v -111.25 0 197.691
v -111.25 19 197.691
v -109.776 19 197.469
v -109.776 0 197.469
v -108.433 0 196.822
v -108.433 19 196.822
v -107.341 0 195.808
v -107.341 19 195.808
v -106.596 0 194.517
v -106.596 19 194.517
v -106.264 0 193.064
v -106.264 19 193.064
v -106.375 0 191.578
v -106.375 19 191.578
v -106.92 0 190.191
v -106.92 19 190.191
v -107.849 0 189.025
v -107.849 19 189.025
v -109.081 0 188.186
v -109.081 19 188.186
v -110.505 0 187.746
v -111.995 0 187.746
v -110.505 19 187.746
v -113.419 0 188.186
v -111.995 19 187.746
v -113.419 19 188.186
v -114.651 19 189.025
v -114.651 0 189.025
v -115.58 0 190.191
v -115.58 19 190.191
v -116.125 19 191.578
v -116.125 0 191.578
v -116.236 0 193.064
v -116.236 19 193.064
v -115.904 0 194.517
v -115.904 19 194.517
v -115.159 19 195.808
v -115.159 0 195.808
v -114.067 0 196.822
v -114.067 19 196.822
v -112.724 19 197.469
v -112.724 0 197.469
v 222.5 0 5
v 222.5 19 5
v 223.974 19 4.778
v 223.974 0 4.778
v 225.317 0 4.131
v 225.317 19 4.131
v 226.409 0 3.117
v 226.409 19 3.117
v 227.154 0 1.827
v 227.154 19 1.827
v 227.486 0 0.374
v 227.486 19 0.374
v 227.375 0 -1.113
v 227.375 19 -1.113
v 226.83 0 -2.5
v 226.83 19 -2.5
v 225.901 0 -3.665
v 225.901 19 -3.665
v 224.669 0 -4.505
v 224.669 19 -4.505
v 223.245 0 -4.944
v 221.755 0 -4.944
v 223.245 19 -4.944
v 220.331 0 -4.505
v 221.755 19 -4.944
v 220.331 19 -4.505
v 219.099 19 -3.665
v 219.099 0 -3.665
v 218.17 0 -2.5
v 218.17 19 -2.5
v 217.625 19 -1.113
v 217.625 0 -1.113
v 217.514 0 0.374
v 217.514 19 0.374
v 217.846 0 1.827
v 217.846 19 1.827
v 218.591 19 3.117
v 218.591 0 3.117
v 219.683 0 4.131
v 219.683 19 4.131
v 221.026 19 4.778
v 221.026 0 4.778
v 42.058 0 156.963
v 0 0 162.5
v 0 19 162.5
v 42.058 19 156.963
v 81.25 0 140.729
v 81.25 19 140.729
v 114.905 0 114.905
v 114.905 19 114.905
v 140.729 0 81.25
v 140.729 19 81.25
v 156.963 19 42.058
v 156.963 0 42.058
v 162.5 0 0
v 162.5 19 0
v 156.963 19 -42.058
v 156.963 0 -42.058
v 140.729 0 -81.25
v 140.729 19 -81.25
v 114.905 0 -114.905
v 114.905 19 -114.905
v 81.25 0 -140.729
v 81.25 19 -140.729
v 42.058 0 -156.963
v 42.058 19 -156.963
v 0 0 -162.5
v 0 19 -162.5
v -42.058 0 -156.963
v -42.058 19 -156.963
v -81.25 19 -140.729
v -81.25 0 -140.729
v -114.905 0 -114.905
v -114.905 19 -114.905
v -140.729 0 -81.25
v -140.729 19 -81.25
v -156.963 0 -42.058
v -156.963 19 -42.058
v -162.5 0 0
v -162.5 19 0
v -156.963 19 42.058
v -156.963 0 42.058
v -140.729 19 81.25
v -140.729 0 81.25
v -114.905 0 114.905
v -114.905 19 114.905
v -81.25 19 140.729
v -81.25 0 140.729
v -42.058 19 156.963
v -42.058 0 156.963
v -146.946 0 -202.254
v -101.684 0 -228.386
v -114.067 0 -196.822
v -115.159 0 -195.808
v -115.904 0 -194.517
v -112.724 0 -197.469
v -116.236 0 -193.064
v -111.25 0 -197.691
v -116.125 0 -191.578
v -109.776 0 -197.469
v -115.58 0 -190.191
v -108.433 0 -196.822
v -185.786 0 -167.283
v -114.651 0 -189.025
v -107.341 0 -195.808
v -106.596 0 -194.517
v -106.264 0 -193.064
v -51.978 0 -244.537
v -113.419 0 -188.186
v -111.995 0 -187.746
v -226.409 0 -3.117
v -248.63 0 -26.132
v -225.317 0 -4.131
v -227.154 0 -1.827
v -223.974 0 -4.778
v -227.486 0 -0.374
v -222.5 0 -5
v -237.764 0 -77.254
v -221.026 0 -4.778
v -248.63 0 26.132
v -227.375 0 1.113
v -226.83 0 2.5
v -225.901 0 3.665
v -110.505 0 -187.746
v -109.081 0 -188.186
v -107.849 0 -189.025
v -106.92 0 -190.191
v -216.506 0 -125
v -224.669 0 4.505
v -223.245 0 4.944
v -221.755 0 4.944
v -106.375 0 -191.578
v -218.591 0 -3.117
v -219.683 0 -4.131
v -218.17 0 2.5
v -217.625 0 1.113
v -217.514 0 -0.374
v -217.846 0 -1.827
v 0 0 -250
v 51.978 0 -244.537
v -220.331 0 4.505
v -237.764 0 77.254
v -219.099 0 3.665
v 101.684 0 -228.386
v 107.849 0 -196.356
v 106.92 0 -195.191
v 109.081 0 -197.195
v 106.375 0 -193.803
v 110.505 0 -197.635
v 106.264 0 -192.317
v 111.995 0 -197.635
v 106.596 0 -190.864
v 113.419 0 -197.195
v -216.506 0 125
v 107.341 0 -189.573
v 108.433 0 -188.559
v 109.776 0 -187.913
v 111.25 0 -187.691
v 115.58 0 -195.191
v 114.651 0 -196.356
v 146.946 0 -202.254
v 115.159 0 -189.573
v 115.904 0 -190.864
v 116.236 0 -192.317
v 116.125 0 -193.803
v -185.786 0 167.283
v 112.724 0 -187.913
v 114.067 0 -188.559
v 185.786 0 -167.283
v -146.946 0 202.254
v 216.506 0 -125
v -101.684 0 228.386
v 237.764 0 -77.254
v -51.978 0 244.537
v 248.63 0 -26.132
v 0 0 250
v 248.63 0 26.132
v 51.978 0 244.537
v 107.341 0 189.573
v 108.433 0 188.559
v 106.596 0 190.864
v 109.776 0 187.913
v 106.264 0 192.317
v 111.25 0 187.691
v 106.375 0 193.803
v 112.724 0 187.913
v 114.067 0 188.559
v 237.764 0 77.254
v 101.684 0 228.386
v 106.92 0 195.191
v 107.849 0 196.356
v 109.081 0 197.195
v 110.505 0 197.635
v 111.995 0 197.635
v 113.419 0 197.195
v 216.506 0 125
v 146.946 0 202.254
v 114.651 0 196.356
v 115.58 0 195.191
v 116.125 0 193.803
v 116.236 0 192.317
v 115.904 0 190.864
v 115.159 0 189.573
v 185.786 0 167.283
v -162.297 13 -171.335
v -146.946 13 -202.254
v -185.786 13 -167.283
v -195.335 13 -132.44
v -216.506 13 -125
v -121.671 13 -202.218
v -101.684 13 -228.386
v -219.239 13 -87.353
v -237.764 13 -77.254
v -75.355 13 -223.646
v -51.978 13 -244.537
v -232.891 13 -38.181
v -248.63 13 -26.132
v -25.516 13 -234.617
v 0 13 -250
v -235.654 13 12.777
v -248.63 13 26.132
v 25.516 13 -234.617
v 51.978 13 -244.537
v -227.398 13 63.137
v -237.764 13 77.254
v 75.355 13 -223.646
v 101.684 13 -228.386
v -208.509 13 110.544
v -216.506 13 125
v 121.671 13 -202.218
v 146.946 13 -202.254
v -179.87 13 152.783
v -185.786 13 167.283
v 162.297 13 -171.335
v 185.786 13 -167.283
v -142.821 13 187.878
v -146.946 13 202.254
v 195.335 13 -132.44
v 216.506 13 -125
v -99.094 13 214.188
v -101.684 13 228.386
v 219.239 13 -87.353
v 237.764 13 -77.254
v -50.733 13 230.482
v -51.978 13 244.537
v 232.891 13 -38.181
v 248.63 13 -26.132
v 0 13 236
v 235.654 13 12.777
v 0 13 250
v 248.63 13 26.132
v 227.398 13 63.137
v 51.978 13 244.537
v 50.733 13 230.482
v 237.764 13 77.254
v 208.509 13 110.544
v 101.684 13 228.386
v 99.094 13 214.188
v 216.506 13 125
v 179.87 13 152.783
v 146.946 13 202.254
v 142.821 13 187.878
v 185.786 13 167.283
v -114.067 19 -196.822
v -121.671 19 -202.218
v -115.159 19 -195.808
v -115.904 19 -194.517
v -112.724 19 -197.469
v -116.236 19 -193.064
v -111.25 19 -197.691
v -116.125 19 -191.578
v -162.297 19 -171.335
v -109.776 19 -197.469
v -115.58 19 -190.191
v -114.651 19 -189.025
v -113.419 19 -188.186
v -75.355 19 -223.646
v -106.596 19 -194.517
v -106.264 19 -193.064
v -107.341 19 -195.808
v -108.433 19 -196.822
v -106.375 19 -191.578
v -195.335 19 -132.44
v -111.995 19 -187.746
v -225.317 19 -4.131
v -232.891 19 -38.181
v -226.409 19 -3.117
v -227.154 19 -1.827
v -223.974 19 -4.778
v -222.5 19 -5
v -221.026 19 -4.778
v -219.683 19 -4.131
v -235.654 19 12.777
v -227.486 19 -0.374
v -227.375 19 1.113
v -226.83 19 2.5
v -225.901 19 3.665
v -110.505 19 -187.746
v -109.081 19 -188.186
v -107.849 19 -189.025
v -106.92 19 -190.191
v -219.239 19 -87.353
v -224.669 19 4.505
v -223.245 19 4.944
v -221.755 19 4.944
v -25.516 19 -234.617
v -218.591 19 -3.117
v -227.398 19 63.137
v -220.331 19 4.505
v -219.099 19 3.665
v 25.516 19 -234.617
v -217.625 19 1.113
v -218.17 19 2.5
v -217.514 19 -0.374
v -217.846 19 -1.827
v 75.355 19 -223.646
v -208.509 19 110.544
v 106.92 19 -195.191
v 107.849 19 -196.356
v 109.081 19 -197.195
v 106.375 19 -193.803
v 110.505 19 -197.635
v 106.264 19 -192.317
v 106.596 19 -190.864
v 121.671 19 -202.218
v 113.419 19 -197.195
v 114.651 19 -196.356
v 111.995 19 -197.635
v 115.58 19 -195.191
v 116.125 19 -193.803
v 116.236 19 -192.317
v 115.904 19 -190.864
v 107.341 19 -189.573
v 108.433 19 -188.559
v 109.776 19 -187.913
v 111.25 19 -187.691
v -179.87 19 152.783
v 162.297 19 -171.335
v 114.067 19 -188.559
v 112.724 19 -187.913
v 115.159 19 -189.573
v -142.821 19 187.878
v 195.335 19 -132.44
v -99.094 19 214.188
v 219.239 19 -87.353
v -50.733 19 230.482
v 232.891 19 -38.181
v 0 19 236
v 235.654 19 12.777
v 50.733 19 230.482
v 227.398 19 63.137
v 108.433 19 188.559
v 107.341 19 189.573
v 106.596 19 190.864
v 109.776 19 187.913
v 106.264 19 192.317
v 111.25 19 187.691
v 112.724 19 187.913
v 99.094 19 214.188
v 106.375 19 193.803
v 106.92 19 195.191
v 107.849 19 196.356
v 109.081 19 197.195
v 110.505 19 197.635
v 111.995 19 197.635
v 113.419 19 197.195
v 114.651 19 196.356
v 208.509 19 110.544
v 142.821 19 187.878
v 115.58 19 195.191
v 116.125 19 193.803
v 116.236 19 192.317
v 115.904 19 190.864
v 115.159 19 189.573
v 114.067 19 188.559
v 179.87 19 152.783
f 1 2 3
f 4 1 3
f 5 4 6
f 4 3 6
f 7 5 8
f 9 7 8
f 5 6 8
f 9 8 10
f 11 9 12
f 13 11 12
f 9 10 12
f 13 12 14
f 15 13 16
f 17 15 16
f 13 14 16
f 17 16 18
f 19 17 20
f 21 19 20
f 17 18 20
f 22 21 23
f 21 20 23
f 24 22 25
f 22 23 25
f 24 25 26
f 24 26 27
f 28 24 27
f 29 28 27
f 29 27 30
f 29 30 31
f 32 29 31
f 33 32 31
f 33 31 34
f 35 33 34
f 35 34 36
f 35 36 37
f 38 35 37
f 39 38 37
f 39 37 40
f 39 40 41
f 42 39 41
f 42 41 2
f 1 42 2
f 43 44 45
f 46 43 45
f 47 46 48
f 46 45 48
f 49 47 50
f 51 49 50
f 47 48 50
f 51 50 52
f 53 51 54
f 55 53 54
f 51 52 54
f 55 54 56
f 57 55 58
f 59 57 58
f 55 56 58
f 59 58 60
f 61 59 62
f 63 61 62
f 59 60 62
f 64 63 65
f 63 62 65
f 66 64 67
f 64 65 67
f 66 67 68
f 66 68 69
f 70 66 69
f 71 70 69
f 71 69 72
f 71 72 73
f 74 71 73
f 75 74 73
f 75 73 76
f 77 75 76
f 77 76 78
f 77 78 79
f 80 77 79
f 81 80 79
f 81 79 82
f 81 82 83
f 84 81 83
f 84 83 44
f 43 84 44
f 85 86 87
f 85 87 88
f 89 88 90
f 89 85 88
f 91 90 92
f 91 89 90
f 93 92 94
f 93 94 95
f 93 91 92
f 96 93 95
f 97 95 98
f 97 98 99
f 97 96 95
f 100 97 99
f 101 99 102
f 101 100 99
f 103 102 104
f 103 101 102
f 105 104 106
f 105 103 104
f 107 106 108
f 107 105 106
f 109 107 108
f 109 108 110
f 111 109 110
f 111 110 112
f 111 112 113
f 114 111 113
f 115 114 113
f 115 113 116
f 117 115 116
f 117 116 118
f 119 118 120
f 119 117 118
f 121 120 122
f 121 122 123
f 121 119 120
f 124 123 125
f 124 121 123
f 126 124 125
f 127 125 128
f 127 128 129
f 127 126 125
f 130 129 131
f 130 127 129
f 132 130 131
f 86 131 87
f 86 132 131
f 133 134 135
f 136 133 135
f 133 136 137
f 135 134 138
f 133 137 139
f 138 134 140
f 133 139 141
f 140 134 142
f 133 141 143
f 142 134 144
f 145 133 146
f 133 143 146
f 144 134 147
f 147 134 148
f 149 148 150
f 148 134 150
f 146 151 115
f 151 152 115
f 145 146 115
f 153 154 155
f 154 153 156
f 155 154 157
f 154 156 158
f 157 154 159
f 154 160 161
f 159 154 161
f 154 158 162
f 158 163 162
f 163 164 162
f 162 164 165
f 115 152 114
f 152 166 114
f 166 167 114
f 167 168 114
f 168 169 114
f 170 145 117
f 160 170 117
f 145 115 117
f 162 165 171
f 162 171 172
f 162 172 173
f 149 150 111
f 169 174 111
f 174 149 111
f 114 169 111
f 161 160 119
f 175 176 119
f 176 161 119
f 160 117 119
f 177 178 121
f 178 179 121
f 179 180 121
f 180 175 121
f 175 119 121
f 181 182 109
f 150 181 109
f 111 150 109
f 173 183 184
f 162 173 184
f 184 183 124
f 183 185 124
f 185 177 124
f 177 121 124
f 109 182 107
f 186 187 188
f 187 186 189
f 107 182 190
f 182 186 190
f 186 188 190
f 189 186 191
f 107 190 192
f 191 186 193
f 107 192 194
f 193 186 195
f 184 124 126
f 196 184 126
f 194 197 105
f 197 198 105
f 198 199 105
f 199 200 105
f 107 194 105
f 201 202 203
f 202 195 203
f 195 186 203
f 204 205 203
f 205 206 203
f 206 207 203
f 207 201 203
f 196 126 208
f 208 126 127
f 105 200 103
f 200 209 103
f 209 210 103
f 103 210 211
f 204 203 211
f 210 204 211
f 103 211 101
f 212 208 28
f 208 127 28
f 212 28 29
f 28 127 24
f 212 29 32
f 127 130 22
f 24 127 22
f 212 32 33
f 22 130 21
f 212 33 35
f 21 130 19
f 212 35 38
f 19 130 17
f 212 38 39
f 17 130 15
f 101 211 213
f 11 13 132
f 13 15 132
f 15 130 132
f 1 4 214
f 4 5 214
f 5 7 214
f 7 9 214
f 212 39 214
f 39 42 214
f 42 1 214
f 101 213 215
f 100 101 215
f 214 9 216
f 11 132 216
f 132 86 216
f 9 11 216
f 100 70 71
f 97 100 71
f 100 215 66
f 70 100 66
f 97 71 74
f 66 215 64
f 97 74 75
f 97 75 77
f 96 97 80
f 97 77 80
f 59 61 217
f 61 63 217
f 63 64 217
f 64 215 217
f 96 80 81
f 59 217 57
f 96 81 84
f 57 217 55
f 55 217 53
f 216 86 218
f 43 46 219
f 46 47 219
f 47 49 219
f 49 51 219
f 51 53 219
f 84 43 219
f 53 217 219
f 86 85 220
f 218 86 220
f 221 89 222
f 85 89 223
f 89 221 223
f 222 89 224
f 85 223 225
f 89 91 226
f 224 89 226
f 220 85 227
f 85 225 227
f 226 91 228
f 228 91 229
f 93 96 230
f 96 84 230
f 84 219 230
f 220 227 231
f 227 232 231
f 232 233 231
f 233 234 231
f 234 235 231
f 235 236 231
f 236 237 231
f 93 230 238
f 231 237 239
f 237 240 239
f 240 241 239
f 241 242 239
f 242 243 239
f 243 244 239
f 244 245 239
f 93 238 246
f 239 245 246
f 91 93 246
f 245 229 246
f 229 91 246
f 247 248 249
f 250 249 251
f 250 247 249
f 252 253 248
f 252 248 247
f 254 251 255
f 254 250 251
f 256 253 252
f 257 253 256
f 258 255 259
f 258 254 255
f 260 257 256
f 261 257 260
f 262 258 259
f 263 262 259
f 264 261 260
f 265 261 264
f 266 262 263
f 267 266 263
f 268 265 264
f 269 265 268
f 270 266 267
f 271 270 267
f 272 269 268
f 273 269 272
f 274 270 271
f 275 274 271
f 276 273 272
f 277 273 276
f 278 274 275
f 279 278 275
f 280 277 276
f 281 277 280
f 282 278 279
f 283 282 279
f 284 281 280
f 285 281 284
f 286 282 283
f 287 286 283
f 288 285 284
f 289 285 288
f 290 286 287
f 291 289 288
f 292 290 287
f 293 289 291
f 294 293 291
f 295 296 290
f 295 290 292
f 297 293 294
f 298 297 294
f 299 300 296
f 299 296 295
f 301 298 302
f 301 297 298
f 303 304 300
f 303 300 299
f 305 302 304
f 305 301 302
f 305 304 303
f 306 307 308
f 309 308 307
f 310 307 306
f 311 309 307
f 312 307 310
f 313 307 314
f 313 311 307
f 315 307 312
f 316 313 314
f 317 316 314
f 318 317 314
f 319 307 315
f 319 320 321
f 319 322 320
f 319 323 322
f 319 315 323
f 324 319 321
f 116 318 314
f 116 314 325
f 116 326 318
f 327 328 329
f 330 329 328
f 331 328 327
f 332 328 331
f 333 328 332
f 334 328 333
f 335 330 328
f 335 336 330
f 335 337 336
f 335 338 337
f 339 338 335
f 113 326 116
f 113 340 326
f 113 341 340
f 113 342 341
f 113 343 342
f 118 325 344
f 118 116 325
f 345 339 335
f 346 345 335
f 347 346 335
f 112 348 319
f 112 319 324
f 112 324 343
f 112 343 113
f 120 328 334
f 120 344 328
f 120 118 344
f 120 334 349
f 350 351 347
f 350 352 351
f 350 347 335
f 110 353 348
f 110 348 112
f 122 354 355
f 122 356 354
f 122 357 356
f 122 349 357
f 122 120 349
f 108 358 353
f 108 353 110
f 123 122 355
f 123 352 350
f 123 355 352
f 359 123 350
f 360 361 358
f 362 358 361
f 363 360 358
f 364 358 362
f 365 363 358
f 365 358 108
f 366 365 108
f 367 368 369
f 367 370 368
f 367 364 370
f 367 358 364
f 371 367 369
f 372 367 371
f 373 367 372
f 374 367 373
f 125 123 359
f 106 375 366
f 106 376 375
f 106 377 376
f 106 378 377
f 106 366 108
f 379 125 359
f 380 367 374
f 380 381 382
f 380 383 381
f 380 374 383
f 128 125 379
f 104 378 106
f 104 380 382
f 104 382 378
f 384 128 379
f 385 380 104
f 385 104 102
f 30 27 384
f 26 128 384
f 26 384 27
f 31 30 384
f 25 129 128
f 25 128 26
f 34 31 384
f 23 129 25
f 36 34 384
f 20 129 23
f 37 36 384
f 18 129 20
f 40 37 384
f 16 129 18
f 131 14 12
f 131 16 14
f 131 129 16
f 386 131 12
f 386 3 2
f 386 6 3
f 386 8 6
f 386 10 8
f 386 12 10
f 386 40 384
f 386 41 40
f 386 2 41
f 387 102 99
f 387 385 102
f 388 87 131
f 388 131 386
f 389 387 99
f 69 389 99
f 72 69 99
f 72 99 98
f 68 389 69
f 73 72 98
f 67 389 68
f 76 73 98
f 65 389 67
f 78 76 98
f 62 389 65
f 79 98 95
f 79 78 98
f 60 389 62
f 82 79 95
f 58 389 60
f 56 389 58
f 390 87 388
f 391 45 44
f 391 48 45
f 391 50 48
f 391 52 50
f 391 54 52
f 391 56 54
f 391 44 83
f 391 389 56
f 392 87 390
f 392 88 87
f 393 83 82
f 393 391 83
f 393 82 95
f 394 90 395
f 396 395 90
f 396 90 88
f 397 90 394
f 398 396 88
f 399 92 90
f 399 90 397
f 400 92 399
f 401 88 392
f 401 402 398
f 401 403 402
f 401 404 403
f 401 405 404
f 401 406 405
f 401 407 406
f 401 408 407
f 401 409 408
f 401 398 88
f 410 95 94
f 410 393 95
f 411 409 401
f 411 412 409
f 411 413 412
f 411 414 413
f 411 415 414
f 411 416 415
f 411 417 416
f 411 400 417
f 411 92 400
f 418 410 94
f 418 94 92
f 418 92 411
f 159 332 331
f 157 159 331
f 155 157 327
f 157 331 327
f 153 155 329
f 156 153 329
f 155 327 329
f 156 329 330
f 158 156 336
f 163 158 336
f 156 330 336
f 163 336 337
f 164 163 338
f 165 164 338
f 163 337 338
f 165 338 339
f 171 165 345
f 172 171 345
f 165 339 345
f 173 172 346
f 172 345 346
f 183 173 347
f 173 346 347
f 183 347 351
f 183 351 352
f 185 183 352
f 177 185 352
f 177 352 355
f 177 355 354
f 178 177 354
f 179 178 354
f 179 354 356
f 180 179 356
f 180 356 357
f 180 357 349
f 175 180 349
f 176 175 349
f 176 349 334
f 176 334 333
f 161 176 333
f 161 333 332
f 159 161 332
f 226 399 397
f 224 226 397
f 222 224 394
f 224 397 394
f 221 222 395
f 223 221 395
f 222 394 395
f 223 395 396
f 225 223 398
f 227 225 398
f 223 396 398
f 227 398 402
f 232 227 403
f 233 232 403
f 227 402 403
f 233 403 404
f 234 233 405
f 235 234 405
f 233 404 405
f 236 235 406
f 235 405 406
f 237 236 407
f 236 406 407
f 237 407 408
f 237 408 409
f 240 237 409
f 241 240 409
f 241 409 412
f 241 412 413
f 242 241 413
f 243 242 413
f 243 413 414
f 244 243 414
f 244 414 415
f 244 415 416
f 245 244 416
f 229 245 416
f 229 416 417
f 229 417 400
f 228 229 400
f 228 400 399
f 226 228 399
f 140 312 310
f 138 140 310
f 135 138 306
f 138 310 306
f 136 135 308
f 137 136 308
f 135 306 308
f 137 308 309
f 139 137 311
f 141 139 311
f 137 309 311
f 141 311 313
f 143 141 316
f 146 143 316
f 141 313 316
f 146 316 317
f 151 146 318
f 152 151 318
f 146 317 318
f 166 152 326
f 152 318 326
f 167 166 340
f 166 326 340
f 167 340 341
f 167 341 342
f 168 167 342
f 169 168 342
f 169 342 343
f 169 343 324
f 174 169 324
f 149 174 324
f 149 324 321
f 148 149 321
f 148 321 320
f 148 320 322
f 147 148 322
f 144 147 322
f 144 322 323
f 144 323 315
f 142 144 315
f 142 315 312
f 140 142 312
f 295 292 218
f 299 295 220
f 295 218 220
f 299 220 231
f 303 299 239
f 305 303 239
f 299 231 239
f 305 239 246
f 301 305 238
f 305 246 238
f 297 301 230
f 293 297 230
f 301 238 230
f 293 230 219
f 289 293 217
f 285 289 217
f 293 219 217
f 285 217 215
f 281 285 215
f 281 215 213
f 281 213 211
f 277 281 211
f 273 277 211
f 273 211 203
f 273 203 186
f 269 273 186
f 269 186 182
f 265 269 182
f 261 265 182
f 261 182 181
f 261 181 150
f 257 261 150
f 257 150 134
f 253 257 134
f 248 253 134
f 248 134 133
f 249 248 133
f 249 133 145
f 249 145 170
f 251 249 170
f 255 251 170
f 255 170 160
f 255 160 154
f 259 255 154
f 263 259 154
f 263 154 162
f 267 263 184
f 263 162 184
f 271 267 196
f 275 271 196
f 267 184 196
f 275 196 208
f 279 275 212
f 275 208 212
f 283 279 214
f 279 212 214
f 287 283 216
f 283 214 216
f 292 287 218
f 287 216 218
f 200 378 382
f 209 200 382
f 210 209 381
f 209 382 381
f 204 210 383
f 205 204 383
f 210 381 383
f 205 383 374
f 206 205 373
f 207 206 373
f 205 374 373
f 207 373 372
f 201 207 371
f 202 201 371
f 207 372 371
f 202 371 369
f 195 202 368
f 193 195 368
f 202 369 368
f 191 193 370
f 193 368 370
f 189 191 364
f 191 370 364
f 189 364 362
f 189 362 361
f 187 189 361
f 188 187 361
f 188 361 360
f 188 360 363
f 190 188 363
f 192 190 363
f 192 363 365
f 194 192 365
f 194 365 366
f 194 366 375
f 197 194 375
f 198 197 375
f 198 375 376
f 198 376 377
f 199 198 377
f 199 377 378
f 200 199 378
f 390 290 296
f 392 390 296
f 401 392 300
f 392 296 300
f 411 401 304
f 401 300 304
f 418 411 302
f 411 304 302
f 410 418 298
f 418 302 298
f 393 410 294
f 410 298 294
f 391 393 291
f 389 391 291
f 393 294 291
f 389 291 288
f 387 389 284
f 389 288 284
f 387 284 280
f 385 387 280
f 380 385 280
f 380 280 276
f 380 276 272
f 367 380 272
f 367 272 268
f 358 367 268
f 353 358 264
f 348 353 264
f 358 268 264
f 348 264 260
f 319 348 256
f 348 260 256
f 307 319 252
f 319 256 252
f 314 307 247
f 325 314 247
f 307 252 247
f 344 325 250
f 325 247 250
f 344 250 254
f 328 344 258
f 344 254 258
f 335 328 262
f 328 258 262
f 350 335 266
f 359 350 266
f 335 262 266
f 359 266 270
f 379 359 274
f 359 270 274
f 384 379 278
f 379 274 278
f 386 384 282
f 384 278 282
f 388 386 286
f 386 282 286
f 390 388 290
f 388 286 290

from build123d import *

# Parameters (mm, degrees)
SKETCH1_R           = 250
SKETCH1_R_2         = 162.5
BOSS_EXTRUDE1_DEPTH = 19
CUT_EXTRUDE1_START  = -6
SKETCH2_R           = 250
SKETCH2_R_2         = 236
CUT_EXTRUDE1_DEPTH  = 6
SKETCH3_R           = 5
CUT_EXTRUDE2_DEPTH  = 355.063553617


with BuildPart() as part:
    # Sketch1 → Boss-Extrude1 (new body)
    with BuildSketch(Plane(origin=(0, 0, 0), x_dir=(1, 0, 0), z_dir=(0, 1, 0))):
        with Locations(Location((0, 0, 0), (0, 0, 270))):
            Circle(SKETCH1_R)
        with Locations(Location((0, 0, 0), (0, 0, 270))):
            Circle(SKETCH1_R_2, mode=Mode.SUBTRACT)
    extrude(amount=BOSS_EXTRUDE1_DEPTH)

    # Sketch2 → Cut-Extrude1 (cut)
    with BuildSketch(Plane(origin=(0, 19, 0), x_dir=(1, 0, 0), z_dir=(0, 1, 0)).offset(CUT_EXTRUDE1_START)):
        with Locations(Location((0, 0, 0), (0, 0, 270))):
            Circle(SKETCH2_R)
        with Locations(Location((0, 0, 0), (0, 0, 270))):
            Circle(SKETCH2_R_2, mode=Mode.SUBTRACT)
    extrude(amount=CUT_EXTRUDE1_DEPTH, mode=Mode.SUBTRACT)

    # Sketch3 → Cut-Extrude2 (cut, through all)
    with BuildSketch(Plane(origin=(0, 19, 0), x_dir=(1, 0, 0), z_dir=(0, 1, 0))):
        with Locations(Location((111.25, 192.690652342, 0), (0, 0, 270))):
            Circle(SKETCH3_R)
        with Locations(Location((111.25, -192.690652342, 0), (0, 0, 90))):
            Circle(SKETCH3_R)
        with Locations(Location((-111.25, -192.690652342, 0), (0, 0, 270))):
            Circle(SKETCH3_R)
        with Locations(Location((222.5, 0, 0), (0, 0, 270))):
            Circle(SKETCH3_R)
        with Locations(Location((-111.25, 192.690652342, 0), (0, 0, 90))):
            Circle(SKETCH3_R)
        with Locations(Location((-222.5, 0, 0), (0, 0, 90))):
            Circle(SKETCH3_R)
    extrude(amount=-CUT_EXTRUDE2_DEPTH, mode=Mode.SUBTRACT)


solid = part.part
